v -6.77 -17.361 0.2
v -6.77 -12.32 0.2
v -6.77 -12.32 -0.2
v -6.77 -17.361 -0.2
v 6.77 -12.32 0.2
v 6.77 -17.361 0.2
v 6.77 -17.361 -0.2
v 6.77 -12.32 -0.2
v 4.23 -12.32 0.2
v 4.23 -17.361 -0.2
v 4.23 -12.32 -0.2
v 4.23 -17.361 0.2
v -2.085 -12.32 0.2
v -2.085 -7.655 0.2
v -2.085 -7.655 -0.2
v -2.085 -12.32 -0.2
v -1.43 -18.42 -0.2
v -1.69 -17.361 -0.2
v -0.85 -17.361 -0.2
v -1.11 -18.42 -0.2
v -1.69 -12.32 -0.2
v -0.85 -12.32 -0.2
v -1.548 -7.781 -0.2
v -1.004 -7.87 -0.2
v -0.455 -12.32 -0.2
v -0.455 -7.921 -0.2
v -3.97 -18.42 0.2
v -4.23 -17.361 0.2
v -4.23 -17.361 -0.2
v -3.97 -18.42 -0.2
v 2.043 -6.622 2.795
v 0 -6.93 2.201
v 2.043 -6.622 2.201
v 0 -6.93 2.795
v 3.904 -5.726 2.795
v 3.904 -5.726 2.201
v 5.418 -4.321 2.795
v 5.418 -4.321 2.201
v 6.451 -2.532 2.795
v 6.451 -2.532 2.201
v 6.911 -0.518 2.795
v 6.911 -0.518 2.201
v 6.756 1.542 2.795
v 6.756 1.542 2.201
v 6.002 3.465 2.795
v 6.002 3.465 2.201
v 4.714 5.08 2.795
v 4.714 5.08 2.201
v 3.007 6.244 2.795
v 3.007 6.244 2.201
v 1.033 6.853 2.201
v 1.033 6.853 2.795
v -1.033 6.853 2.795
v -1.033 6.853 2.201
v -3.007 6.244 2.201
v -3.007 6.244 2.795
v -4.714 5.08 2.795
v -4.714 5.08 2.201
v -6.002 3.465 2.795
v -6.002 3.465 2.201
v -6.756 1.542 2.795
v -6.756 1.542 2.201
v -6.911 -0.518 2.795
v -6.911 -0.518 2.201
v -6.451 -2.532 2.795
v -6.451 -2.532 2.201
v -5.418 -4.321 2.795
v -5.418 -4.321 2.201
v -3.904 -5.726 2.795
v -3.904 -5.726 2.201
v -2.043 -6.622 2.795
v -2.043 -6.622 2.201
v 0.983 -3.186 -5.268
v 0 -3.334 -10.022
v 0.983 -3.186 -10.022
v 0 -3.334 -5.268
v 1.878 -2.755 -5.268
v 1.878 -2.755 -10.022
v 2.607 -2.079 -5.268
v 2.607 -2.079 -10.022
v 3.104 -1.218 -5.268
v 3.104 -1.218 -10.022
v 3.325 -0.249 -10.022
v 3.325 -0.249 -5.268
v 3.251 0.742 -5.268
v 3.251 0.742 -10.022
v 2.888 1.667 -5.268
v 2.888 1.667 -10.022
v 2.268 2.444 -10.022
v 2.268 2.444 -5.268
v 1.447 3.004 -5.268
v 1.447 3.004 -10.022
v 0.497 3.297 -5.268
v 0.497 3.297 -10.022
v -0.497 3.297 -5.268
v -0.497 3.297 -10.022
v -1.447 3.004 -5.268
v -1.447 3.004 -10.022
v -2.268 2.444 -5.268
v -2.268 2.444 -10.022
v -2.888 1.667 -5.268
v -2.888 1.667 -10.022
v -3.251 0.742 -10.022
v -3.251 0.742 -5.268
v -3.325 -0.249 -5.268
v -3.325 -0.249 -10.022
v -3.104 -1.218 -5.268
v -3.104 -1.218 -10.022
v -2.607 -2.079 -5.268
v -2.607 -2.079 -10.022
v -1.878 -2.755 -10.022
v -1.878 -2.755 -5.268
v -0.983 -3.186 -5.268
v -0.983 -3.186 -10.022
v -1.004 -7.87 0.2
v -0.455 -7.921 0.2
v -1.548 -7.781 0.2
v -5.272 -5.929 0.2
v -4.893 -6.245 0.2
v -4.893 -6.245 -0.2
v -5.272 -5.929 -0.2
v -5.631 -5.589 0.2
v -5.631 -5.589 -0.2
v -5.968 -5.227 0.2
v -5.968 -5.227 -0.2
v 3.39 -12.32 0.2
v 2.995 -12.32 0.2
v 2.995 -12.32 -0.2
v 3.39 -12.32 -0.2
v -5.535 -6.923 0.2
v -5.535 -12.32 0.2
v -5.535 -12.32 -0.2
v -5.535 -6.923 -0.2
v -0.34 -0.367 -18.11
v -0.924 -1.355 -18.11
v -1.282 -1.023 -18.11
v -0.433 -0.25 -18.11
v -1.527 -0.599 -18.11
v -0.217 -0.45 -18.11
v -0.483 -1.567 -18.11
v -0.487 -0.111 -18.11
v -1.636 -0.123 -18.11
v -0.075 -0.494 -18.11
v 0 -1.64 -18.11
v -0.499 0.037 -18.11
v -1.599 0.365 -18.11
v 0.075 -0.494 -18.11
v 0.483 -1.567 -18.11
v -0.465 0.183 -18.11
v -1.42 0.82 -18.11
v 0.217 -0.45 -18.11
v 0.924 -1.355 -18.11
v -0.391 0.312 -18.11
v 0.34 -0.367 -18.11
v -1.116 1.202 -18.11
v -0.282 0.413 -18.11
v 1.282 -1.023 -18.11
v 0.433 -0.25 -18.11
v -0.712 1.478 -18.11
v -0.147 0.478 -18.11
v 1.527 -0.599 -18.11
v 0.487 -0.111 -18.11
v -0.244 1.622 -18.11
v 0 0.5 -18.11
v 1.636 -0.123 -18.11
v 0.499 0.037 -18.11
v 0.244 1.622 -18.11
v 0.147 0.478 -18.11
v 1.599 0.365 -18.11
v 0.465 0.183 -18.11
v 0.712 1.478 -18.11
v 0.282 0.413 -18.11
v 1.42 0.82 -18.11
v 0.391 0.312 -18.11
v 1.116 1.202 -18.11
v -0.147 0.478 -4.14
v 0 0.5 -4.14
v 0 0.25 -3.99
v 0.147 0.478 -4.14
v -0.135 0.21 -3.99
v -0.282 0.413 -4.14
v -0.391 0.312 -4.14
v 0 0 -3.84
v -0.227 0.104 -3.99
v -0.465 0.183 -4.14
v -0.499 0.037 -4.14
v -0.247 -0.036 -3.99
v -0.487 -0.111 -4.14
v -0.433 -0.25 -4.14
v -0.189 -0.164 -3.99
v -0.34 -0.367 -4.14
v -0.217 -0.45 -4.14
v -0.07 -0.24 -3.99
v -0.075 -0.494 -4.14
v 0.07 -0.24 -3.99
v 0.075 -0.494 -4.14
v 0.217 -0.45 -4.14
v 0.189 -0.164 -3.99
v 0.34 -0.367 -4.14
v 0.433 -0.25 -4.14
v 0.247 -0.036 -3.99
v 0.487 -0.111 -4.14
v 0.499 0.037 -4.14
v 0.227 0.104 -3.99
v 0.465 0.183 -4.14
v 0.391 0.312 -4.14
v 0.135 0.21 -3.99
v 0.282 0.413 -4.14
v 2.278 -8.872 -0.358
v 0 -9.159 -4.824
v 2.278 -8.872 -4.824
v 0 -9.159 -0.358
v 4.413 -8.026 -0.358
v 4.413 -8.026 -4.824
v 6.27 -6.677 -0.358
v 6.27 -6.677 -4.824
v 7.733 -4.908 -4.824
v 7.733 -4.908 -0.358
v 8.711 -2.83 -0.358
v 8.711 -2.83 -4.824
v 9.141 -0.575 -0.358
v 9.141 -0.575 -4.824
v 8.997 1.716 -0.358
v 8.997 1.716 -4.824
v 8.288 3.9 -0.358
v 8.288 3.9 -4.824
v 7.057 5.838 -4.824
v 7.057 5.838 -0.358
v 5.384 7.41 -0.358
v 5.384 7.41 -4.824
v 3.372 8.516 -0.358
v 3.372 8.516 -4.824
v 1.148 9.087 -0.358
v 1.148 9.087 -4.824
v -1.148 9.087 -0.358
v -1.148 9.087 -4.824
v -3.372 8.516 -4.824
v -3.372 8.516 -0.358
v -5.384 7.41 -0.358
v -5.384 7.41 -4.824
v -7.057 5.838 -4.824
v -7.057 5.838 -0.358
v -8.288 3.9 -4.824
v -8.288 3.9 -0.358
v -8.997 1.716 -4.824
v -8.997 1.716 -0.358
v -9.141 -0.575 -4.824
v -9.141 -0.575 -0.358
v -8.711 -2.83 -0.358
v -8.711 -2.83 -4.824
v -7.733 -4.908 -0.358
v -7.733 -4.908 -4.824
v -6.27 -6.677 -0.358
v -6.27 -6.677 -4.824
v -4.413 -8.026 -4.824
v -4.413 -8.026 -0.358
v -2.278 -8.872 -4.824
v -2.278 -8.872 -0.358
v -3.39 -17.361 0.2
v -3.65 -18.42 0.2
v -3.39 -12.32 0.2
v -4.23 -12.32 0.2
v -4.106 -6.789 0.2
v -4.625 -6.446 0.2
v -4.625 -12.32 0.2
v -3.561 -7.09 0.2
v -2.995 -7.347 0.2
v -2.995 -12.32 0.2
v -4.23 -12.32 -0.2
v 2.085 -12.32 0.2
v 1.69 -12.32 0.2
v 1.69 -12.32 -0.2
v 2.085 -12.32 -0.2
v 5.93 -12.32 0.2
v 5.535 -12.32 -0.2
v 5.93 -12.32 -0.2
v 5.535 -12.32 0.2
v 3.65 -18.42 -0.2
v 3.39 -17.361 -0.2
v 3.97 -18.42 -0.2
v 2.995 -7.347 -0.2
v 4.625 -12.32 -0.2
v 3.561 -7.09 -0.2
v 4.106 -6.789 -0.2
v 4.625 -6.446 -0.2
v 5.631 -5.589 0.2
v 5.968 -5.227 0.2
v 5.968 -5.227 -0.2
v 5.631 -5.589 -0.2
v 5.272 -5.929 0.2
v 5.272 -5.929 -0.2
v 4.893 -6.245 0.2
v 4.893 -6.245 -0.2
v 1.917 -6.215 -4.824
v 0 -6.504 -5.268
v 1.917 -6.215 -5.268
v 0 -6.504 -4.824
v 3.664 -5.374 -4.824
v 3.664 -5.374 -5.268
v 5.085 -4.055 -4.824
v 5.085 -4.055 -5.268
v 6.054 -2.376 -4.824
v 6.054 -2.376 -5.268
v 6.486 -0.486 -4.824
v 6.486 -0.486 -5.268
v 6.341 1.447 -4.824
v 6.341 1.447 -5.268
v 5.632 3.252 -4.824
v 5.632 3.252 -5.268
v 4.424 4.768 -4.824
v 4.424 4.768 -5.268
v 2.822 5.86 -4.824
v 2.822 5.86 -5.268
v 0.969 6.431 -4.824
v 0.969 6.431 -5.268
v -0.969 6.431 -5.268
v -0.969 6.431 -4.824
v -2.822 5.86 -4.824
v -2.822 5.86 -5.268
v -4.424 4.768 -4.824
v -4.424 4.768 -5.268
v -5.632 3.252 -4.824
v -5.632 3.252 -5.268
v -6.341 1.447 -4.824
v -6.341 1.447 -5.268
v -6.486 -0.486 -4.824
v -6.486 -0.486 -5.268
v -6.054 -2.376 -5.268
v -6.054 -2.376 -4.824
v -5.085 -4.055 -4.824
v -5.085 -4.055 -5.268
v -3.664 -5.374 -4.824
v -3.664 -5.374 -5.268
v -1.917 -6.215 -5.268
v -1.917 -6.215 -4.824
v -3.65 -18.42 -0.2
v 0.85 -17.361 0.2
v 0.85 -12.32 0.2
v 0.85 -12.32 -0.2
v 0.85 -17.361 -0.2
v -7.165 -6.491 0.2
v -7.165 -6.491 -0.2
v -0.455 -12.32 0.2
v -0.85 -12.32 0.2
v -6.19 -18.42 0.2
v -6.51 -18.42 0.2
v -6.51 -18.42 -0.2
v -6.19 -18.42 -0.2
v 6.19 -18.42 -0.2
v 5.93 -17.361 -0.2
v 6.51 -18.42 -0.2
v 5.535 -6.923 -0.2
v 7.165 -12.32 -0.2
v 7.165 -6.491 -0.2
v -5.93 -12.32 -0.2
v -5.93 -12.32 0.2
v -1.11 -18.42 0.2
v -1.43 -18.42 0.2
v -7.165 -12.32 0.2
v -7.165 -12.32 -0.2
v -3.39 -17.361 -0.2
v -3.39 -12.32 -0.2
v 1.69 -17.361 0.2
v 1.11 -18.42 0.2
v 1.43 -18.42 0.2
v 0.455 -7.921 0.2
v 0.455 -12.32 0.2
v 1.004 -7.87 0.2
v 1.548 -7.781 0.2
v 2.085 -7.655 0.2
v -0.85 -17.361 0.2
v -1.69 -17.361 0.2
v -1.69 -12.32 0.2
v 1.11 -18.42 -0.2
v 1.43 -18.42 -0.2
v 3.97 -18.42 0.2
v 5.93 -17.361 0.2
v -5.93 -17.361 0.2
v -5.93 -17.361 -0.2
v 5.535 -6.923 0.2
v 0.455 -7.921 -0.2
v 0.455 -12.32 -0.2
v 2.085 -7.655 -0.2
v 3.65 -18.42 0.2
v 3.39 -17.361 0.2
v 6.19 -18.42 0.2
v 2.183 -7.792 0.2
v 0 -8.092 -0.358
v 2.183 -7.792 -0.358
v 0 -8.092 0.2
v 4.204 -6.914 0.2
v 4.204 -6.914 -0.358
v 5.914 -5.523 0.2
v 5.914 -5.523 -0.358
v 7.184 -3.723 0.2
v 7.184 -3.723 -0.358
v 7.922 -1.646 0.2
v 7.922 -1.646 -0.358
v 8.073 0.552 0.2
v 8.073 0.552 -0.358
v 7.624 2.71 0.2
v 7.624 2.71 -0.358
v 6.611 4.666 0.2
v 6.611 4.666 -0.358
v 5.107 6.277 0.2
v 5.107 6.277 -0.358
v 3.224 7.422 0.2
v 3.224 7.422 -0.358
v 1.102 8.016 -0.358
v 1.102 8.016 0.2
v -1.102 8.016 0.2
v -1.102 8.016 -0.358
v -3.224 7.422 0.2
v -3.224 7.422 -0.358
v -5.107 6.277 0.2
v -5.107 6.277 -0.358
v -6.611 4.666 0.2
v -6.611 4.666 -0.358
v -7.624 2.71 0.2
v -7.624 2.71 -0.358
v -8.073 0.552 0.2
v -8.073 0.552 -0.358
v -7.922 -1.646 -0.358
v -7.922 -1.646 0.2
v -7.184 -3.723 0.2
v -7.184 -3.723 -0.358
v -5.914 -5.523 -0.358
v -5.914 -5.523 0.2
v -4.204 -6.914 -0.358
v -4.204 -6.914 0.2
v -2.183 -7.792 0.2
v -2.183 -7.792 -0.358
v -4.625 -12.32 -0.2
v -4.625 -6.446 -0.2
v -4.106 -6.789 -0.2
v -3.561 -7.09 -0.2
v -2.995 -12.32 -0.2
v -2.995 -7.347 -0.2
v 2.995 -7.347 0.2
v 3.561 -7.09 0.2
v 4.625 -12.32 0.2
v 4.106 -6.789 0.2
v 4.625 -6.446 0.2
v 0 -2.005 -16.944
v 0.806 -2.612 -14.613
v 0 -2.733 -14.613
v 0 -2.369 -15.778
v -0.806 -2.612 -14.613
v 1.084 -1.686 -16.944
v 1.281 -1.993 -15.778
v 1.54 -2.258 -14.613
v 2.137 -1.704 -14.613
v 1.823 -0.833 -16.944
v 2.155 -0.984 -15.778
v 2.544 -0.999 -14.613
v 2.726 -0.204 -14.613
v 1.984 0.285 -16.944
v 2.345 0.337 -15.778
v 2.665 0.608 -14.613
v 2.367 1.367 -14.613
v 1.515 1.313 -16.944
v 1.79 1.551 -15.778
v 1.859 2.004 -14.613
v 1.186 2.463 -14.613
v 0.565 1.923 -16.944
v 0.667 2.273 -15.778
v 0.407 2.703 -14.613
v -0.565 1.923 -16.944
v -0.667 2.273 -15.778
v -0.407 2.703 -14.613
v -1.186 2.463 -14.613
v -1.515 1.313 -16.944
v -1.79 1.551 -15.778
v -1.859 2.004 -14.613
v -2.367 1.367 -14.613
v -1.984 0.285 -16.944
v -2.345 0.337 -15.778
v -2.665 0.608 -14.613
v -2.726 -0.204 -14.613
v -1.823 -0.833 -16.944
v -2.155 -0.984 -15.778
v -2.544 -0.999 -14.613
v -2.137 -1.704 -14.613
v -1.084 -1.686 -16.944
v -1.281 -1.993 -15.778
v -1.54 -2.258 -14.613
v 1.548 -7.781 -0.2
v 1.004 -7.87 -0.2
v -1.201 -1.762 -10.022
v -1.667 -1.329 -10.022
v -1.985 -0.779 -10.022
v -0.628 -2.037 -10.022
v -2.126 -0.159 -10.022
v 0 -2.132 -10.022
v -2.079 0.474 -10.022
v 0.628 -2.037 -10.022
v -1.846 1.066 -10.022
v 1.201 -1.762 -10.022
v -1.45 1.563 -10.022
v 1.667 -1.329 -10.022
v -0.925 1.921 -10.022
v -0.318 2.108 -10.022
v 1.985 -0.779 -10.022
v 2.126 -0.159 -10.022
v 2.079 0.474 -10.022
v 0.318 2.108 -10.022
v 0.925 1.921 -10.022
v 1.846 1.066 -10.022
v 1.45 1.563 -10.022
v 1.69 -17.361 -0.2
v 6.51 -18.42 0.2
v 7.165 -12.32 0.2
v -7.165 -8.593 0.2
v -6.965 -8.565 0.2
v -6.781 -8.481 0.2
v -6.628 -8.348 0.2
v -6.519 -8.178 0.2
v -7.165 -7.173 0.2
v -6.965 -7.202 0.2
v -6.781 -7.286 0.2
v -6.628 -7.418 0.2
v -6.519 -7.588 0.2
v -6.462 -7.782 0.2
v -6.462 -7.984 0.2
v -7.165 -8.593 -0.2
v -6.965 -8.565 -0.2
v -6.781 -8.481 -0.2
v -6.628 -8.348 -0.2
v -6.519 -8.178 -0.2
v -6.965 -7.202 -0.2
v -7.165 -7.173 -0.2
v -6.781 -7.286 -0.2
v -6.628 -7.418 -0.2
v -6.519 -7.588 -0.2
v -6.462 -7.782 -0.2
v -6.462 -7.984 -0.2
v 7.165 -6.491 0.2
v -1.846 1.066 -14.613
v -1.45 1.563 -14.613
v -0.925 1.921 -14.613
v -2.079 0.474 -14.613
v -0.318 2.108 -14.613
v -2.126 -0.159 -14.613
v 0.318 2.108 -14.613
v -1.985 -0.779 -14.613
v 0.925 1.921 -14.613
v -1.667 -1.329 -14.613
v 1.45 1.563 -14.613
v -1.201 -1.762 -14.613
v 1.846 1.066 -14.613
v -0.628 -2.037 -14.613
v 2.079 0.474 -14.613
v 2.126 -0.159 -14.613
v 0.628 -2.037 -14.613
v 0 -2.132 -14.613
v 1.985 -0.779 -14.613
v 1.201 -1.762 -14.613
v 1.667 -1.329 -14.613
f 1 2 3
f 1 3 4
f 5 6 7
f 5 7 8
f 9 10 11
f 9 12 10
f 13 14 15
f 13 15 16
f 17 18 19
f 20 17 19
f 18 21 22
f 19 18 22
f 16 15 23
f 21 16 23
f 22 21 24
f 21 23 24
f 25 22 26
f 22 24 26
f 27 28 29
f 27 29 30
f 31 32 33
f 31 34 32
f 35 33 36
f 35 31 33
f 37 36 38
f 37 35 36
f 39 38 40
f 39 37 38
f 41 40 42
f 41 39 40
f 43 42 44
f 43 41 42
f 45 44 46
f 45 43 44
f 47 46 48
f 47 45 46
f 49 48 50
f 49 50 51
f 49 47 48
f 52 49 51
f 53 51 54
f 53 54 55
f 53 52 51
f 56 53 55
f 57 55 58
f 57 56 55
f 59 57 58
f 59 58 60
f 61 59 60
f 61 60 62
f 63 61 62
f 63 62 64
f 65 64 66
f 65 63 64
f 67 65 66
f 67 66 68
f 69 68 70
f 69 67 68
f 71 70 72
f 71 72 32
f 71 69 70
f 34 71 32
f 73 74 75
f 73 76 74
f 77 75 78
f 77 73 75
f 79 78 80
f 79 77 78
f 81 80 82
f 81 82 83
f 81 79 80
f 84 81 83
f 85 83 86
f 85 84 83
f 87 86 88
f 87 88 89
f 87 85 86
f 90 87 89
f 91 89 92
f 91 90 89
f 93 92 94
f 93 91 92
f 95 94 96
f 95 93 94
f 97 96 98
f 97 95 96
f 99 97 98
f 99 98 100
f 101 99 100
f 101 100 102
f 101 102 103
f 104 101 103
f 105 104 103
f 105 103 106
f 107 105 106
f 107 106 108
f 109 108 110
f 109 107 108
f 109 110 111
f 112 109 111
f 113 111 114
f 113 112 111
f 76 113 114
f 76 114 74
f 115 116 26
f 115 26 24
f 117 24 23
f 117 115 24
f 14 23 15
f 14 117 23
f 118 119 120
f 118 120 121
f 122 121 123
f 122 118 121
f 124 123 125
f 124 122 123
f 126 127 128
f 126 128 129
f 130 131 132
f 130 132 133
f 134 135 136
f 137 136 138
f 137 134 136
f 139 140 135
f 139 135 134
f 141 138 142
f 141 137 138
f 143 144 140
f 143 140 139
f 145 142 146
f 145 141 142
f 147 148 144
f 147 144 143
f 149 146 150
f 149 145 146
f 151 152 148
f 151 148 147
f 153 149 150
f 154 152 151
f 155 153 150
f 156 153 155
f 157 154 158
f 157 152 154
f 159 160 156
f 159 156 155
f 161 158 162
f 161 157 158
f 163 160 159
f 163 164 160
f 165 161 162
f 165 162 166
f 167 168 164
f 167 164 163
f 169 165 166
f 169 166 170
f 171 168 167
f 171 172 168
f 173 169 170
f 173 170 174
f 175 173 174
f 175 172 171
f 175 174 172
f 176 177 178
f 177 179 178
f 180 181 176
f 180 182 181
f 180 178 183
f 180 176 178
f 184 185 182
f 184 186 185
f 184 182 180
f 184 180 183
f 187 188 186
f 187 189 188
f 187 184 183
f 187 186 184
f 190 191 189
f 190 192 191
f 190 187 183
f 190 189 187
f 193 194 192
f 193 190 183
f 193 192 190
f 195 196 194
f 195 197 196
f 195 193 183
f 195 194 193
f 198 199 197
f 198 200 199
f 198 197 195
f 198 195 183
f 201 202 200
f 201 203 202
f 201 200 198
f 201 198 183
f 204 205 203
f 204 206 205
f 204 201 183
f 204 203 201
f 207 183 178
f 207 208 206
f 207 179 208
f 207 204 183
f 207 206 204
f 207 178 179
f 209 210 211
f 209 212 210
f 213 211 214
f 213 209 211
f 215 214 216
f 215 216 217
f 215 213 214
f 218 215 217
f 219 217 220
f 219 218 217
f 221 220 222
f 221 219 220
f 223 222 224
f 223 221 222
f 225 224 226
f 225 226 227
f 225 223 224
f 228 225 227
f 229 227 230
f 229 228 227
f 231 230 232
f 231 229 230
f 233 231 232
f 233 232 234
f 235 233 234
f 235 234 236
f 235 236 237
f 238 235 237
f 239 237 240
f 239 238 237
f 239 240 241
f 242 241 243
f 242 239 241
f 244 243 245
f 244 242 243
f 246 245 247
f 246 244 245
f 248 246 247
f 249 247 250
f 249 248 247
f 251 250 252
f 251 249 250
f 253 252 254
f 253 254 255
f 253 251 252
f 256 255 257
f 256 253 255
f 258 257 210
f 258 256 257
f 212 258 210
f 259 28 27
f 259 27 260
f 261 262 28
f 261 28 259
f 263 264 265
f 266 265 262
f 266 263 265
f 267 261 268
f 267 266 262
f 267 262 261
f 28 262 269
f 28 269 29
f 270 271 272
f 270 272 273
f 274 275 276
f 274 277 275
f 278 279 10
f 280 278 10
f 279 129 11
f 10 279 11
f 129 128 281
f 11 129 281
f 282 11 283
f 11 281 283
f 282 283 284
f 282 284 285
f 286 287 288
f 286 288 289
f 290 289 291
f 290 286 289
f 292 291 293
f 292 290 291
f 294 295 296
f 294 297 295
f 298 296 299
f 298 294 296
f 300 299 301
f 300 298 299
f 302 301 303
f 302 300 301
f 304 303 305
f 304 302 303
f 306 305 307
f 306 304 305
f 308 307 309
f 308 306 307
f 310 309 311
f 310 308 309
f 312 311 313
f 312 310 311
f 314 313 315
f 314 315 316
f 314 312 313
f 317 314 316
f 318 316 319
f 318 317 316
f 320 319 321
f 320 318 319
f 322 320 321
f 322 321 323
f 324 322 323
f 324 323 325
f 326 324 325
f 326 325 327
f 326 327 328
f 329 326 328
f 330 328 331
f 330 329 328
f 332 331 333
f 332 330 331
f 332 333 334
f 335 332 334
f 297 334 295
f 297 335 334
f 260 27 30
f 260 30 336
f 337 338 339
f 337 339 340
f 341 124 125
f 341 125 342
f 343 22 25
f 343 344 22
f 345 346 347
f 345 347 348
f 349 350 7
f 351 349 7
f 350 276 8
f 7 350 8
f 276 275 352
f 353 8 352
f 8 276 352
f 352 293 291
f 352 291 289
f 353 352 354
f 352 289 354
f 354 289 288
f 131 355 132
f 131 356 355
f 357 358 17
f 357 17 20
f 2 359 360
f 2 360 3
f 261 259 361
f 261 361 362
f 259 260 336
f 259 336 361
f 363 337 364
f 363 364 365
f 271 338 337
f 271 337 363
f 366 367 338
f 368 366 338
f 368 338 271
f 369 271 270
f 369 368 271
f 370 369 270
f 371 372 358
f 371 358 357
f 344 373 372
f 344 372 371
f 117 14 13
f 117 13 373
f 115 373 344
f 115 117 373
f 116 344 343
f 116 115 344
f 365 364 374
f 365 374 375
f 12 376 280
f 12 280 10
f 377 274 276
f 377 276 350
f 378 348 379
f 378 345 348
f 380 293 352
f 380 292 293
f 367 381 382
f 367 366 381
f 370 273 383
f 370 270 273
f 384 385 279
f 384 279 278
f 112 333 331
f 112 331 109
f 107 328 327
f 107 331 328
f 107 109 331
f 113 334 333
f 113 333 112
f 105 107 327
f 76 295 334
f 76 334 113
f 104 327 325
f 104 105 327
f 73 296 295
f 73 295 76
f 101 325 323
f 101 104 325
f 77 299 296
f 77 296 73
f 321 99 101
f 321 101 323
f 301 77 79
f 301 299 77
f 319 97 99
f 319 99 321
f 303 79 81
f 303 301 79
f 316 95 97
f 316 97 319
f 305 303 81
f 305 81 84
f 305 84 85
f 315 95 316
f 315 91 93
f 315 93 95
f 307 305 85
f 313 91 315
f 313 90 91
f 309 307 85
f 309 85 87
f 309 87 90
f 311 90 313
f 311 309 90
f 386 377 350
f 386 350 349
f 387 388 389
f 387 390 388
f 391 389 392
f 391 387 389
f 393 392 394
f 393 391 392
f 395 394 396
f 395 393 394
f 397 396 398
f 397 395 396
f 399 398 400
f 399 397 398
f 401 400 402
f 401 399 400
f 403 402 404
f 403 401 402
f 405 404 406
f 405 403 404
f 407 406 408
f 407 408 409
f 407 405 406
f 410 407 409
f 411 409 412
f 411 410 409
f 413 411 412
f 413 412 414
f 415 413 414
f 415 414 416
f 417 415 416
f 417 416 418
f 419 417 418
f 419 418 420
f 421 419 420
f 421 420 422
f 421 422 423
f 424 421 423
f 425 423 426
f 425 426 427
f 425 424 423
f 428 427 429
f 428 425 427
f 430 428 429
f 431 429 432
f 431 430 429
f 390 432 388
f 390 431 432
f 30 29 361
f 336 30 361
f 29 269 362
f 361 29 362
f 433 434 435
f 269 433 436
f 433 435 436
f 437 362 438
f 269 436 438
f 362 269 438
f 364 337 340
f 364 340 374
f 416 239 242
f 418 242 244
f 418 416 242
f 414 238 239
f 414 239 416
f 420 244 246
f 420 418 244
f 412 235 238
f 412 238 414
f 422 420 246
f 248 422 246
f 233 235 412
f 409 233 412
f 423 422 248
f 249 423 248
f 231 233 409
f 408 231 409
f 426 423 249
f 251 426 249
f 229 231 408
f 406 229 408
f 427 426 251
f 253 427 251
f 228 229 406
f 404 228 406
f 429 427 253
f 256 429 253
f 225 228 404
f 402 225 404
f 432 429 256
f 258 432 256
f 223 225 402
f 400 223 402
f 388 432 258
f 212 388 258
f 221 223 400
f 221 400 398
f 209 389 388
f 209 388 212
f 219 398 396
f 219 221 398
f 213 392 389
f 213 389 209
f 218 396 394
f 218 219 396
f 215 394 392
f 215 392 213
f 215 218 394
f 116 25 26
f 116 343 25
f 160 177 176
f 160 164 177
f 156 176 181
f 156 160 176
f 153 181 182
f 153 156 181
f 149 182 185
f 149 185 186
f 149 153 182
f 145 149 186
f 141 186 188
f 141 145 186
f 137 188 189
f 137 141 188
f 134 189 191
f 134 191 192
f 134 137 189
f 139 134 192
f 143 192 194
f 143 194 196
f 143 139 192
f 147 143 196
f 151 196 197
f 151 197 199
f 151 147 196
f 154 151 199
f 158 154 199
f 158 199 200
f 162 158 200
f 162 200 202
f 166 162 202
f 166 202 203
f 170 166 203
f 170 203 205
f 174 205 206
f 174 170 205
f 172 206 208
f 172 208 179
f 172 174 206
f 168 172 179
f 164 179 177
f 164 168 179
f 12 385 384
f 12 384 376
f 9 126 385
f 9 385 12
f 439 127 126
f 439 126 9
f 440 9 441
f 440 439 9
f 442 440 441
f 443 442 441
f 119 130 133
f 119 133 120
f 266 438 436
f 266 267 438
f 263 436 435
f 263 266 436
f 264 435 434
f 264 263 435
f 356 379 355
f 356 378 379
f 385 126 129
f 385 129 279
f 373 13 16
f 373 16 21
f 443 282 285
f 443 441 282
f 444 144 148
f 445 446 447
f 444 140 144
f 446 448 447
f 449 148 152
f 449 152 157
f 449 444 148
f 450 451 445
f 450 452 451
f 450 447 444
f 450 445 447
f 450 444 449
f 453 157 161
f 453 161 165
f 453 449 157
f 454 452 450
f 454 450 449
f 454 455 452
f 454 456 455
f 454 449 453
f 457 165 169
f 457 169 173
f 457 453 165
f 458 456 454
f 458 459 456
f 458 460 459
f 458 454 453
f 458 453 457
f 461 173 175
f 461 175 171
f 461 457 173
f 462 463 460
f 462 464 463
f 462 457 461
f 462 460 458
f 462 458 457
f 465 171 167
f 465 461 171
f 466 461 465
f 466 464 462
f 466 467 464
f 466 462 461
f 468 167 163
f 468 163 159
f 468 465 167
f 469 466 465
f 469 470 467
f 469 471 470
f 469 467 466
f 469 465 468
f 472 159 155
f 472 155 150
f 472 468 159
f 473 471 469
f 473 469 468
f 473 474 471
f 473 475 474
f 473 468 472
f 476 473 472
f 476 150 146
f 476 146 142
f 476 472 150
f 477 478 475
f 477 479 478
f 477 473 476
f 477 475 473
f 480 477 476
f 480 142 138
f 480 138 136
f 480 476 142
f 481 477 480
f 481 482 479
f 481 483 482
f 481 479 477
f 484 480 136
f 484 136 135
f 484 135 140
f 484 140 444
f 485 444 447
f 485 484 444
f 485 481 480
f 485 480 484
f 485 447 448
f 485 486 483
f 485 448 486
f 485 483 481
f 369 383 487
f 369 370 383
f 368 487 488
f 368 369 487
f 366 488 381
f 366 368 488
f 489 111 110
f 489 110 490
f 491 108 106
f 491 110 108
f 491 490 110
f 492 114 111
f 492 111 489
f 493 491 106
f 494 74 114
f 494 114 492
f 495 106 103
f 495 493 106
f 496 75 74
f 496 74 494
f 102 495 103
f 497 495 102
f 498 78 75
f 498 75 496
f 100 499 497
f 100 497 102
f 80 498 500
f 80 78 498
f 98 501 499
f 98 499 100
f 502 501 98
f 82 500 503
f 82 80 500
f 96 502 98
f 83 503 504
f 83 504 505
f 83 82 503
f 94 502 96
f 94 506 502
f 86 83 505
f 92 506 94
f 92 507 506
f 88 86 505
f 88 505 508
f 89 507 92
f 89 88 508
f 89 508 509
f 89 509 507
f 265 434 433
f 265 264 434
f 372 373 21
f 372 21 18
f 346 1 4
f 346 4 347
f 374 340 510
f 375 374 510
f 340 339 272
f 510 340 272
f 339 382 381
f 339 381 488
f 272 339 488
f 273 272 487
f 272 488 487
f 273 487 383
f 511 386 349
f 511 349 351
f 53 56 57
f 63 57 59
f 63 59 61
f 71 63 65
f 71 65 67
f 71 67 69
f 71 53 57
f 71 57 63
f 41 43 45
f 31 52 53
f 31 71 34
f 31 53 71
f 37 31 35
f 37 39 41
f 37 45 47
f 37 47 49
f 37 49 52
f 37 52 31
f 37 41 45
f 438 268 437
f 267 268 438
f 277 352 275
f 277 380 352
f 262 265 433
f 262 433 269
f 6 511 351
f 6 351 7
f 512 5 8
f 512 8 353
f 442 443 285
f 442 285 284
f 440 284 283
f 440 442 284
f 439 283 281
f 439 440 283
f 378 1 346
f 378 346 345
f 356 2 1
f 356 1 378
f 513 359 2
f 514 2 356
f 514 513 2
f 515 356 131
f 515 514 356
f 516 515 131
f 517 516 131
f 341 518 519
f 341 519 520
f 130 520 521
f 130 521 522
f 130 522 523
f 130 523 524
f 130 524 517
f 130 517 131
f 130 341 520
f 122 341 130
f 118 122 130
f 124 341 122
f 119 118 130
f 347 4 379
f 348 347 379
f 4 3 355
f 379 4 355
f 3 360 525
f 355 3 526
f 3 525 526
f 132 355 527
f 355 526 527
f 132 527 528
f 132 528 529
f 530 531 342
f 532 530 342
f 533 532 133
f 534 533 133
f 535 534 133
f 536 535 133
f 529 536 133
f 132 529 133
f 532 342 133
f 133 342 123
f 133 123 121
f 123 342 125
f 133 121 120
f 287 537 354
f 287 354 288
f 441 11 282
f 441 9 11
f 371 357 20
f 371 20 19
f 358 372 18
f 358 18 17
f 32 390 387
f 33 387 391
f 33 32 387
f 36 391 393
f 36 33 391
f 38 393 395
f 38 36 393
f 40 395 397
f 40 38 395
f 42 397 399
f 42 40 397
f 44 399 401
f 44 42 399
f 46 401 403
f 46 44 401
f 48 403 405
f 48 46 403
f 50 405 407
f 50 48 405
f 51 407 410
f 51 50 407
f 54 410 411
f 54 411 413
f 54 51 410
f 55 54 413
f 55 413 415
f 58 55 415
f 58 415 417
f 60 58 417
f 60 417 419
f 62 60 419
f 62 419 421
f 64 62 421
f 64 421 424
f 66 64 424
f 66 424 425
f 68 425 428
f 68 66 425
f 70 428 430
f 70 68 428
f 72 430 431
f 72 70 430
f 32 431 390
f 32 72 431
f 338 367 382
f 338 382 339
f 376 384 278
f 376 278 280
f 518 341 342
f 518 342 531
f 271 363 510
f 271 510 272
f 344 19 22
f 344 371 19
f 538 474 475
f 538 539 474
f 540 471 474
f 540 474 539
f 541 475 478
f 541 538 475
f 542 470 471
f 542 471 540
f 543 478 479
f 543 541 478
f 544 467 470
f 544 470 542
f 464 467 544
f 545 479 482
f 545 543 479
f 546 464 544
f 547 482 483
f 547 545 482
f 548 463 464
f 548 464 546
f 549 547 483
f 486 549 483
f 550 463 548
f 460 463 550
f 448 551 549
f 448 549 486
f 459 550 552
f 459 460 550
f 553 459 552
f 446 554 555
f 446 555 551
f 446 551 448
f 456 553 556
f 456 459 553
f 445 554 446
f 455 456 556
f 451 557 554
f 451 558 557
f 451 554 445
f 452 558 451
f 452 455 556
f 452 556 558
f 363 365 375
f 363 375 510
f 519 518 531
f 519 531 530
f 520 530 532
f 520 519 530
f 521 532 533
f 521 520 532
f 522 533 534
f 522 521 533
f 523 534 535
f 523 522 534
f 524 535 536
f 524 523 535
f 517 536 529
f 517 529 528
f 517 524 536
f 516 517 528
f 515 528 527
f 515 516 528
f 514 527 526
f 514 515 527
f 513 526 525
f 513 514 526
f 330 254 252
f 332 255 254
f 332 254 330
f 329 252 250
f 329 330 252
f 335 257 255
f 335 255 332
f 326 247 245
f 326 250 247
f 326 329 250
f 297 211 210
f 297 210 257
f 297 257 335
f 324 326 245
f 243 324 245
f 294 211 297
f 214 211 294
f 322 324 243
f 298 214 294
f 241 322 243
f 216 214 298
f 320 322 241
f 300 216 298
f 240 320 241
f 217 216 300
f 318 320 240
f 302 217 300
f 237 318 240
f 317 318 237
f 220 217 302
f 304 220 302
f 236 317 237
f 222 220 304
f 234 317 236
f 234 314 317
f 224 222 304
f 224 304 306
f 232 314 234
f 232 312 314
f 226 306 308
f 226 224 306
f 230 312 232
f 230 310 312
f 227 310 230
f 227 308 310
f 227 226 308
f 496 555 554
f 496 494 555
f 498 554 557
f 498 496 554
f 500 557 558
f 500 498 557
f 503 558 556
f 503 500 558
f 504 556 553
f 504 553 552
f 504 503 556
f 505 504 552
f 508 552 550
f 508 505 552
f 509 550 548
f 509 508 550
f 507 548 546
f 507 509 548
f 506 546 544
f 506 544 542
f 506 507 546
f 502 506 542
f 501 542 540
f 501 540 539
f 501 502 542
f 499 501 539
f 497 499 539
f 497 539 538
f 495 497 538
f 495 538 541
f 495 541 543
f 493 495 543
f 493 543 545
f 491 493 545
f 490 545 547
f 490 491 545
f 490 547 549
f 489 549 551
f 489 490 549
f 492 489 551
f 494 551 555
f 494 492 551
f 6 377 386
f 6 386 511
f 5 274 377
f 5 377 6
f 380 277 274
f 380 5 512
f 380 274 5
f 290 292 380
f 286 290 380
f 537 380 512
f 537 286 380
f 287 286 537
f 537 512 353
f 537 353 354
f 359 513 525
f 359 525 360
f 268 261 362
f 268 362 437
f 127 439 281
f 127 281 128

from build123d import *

# Parameters (mm, degrees)
EXTRUDE6_DEPTH        = 0.2
EXTRUDE6_DEPTH_BACK   = 0.2
EXTRUDE6_2_DEPTH      = 0.2
EXTRUDE6_2_DEPTH_BACK = 0.2
EXTRUDE6_3_DEPTH      = 0.2
EXTRUDE6_3_DEPTH_BACK = 0.2
EXTRUDE6_4_DEPTH      = 0.2
EXTRUDE6_4_DEPTH_BACK = 0.2
EXTRUDE6_5_DEPTH      = 0.2
EXTRUDE6_5_DEPTH_BACK = 0.2
EXTRUDE6_6_DEPTH      = 0.2
EXTRUDE6_6_DEPTH_BACK = 0.2


with BuildPart() as part:
    # Sketch7 → Extrude6 (new body, two sides)
    with BuildSketch(Plane.XY) as extrude6_sk:
        with BuildLine():
            Line((-5.93, -12.32), (-5.535, -12.32))
            Line((-5.535, -12.32), (-5.535, -6.923244628))
            Line((-5.535, -6.923244628), (-4.893151867, -6.24528278))
            ThreePointArc((-4.893151867, -6.24528278), (-5.454552369, -5.761453866), (-5.968357327, -5.227351434))
            Line((-5.968357327, -5.227351434), (-7.165, -6.49132345))
            Line((-7.165, -6.49132345), (-7.165, -7.17281133))
            ThreePointArc((-7.165, -7.17281133), (-6.454703172, -7.883108158), (-7.165, -8.593404986))
            Line((-7.165, -8.593404986), (-7.165, -12.32))
            Line((-7.165, -12.32), (-6.77, -12.32))
            Line((-6.77, -12.32), (-6.77, -17.360738904))
            Line((-6.77, -17.360738904), (-6.510329667, -18.42))
            Line((-6.510329667, -18.42), (-6.189670333, -18.42))
            Line((-6.189670333, -18.42), (-5.93, -17.360738904))
            Line((-5.93, -17.360738904), (-5.93, -12.32))
        make_face()
    extrude(amount=EXTRUDE6_DEPTH)
    extrude(extrude6_sk.sketch, amount=-EXTRUDE6_DEPTH_BACK)


with BuildPart() as body_2:
    # Sketch7 → Extrude6 2 (new body, two sides)
    with BuildSketch(Plane.XY) as extrude6_2_sk:
        with BuildLine():
            Line((-4.625, -6.446384041), (-4.625, -12.32))
            Line((-4.625, -12.32), (-4.23, -12.32))
            Line((-4.23, -12.32), (-4.23, -17.360738904))
            Line((-4.23, -17.360738904), (-3.970329667, -18.42))
            Line((-3.970329667, -18.42), (-3.649670333, -18.42))
            Line((-3.649670333, -18.42), (-3.39, -17.360738904))
            Line((-3.39, -17.360738904), (-3.39, -12.32))
            Line((-3.39, -12.32), (-2.995, -12.32))
            Line((-2.995, -12.32), (-2.995, -7.34686785))
            ThreePointArc((-2.995, -7.34686785), (-3.836511146, -6.944614779), (-4.625, -6.446384041))
        make_face()
    extrude(amount=EXTRUDE6_2_DEPTH)
    extrude(extrude6_2_sk.sketch, amount=-EXTRUDE6_2_DEPTH_BACK)


with BuildPart() as body_3:
    # Sketch7 → Extrude6 3 (new body, two sides)
    with BuildSketch(Plane.XY) as extrude6_3_sk:
        with BuildLine():
            Line((-0.455, -12.32), (-0.455, -7.920824907))
            ThreePointArc((-0.455, -7.920824907), (-1.276935244, -7.830448811), (-2.085, -7.65501582))
            Line((-2.085, -7.65501582), (-2.085, -12.32))
            Line((-2.085, -12.32), (-1.69, -12.32))
            Line((-1.69, -12.32), (-1.69, -17.360738904))
            Line((-1.69, -17.360738904), (-1.430329667, -18.42))
            Line((-1.430329667, -18.42), (-1.109670333, -18.42))
            Line((-1.109670333, -18.42), (-0.85, -17.360738904))
            Line((-0.85, -17.360738904), (-0.85, -12.32))
            Line((-0.85, -12.32), (-0.455, -12.32))
        make_face()
    extrude(amount=EXTRUDE6_3_DEPTH)
    extrude(extrude6_3_sk.sketch, amount=-EXTRUDE6_3_DEPTH_BACK)


with BuildPart() as body_4:
    # Sketch7 → Extrude6 4 (new body, two sides)
    with BuildSketch(Plane.XY) as extrude6_4_sk:
        with BuildLine():
            Line((4.625, -12.32), (4.625, -6.446384041))
            ThreePointArc((4.625, -6.446384041), (3.836511146, -6.944614779), (2.995, -7.34686785))
            Line((2.995, -7.34686785), (2.995, -12.32))
            Line((2.995, -12.32), (3.39, -12.32))
            Line((3.39, -12.32), (3.39, -17.360738904))
            Line((3.39, -17.360738904), (3.649670333, -18.42))
            Line((3.649670333, -18.42), (3.970329667, -18.42))
            Line((3.970329667, -18.42), (4.23, -17.360738904))
            Line((4.23, -17.360738904), (4.23, -12.32))
            Line((4.23, -12.32), (4.625, -12.32))
        make_face()
    extrude(amount=EXTRUDE6_4_DEPTH)
    extrude(extrude6_4_sk.sketch, amount=-EXTRUDE6_4_DEPTH_BACK)


with BuildPart() as body_5:
    # Sketch7 → Extrude6 5 (new body, two sides)
    with BuildSketch(Plane.XY) as extrude6_5_sk:
        with BuildLine():
            Line((0.455, -7.920824907), (0.455, -12.32))
            Line((0.455, -12.32), (0.85, -12.32))
            Line((0.85, -12.32), (0.85, -17.360738904))
            Line((0.85, -17.360738904), (1.109670333, -18.42))
            Line((1.109670333, -18.42), (1.430329667, -18.42))
            Line((1.430329667, -18.42), (1.69, -17.360738904))
            Line((1.69, -17.360738904), (1.69, -12.32))
            Line((1.69, -12.32), (2.085, -12.32))
            Line((2.085, -12.32), (2.085, -7.65501582))
            ThreePointArc((2.085, -7.65501582), (1.276935244, -7.830448811), (0.455, -7.920824907))
        make_face()
    extrude(amount=EXTRUDE6_5_DEPTH)
    extrude(extrude6_5_sk.sketch, amount=-EXTRUDE6_5_DEPTH_BACK)


with BuildPart() as body_6:
    # Sketch7 → Extrude6 6 (new body, two sides)
    with BuildSketch(Plane.XY) as extrude6_6_sk:
        with BuildLine():
            Line((5.535, -12.32), (5.93, -12.32))
            Line((5.93, -12.32), (5.93, -17.360738904))
            Line((5.93, -17.360738904), (6.189670333, -18.42))
            Line((6.189670333, -18.42), (6.510329667, -18.42))
            Line((6.510329667, -18.42), (6.77, -17.360738904))
            Line((6.77, -17.360738904), (6.77, -12.32))
            Line((6.77, -12.32), (7.165, -12.32))
            Line((7.165, -12.32), (7.165, -6.49132345))
            Line((7.165, -6.49132345), (5.968357327, -5.227351434))
            ThreePointArc((5.968357327, -5.227351434), (5.454552369, -5.761453866), (4.893151867, -6.24528278))
            Line((4.893151867, -6.24528278), (5.535, -6.923244628))
            Line((5.535, -6.923244628), (5.535, -12.32))
        make_face()
    extrude(amount=EXTRUDE6_6_DEPTH)
    extrude(extrude6_6_sk.sketch, amount=-EXTRUDE6_6_DEPTH_BACK)


with BuildPart() as body_7:
    # Sketch8 → Revolve1 (revolve)
    with BuildSketch(Plane(origin=(0, 0, 0), x_dir=(0, 0, -1), z_dir=(1, 0, 0))):
        Polygon((0.358195537, -9.159281465), (0.358195537, -8.091601843), (-0.2, -8.091601843), (-2.200853855, -6.93), (-2.795, -6.93), (-2.795, 0), (18.110064994, 0), (18.110064994, -1.640232074), (14.612633893, -2.733179292), (14.612633893, -2.132058322), (10.022255574, -2.132058322), (10.022255574, -3.334300263), (5.267935171, -3.334300263), (5.267935171, -6.503847198), (4.823772505, -6.503847198), (4.823772505, -9.159281465), align=None)
    revolve(axis=Axis((0, 0, 0), (0, 0, 1)))

    # Sketch9 → Ø1.0 (1) Diameter Hole1 (revolve, cut)
    with BuildSketch(Plane(origin=(0, 0, -18.110064994), x_dir=(0, 1, 0), z_dir=(1, 0, 0))):
        Polygon((0, 0), (0, 14.27043031), (0.5, 13.97), (0.5, 0), align=None)
    revolve(axis=Axis((0, 0, -24.460064994), (0, 0, 1)), mode=Mode.SUBTRACT)


solid = Compound([part.part, body_2.part, body_3.part, body_4.part, body_5.part, body_6.part, body_7.part])
